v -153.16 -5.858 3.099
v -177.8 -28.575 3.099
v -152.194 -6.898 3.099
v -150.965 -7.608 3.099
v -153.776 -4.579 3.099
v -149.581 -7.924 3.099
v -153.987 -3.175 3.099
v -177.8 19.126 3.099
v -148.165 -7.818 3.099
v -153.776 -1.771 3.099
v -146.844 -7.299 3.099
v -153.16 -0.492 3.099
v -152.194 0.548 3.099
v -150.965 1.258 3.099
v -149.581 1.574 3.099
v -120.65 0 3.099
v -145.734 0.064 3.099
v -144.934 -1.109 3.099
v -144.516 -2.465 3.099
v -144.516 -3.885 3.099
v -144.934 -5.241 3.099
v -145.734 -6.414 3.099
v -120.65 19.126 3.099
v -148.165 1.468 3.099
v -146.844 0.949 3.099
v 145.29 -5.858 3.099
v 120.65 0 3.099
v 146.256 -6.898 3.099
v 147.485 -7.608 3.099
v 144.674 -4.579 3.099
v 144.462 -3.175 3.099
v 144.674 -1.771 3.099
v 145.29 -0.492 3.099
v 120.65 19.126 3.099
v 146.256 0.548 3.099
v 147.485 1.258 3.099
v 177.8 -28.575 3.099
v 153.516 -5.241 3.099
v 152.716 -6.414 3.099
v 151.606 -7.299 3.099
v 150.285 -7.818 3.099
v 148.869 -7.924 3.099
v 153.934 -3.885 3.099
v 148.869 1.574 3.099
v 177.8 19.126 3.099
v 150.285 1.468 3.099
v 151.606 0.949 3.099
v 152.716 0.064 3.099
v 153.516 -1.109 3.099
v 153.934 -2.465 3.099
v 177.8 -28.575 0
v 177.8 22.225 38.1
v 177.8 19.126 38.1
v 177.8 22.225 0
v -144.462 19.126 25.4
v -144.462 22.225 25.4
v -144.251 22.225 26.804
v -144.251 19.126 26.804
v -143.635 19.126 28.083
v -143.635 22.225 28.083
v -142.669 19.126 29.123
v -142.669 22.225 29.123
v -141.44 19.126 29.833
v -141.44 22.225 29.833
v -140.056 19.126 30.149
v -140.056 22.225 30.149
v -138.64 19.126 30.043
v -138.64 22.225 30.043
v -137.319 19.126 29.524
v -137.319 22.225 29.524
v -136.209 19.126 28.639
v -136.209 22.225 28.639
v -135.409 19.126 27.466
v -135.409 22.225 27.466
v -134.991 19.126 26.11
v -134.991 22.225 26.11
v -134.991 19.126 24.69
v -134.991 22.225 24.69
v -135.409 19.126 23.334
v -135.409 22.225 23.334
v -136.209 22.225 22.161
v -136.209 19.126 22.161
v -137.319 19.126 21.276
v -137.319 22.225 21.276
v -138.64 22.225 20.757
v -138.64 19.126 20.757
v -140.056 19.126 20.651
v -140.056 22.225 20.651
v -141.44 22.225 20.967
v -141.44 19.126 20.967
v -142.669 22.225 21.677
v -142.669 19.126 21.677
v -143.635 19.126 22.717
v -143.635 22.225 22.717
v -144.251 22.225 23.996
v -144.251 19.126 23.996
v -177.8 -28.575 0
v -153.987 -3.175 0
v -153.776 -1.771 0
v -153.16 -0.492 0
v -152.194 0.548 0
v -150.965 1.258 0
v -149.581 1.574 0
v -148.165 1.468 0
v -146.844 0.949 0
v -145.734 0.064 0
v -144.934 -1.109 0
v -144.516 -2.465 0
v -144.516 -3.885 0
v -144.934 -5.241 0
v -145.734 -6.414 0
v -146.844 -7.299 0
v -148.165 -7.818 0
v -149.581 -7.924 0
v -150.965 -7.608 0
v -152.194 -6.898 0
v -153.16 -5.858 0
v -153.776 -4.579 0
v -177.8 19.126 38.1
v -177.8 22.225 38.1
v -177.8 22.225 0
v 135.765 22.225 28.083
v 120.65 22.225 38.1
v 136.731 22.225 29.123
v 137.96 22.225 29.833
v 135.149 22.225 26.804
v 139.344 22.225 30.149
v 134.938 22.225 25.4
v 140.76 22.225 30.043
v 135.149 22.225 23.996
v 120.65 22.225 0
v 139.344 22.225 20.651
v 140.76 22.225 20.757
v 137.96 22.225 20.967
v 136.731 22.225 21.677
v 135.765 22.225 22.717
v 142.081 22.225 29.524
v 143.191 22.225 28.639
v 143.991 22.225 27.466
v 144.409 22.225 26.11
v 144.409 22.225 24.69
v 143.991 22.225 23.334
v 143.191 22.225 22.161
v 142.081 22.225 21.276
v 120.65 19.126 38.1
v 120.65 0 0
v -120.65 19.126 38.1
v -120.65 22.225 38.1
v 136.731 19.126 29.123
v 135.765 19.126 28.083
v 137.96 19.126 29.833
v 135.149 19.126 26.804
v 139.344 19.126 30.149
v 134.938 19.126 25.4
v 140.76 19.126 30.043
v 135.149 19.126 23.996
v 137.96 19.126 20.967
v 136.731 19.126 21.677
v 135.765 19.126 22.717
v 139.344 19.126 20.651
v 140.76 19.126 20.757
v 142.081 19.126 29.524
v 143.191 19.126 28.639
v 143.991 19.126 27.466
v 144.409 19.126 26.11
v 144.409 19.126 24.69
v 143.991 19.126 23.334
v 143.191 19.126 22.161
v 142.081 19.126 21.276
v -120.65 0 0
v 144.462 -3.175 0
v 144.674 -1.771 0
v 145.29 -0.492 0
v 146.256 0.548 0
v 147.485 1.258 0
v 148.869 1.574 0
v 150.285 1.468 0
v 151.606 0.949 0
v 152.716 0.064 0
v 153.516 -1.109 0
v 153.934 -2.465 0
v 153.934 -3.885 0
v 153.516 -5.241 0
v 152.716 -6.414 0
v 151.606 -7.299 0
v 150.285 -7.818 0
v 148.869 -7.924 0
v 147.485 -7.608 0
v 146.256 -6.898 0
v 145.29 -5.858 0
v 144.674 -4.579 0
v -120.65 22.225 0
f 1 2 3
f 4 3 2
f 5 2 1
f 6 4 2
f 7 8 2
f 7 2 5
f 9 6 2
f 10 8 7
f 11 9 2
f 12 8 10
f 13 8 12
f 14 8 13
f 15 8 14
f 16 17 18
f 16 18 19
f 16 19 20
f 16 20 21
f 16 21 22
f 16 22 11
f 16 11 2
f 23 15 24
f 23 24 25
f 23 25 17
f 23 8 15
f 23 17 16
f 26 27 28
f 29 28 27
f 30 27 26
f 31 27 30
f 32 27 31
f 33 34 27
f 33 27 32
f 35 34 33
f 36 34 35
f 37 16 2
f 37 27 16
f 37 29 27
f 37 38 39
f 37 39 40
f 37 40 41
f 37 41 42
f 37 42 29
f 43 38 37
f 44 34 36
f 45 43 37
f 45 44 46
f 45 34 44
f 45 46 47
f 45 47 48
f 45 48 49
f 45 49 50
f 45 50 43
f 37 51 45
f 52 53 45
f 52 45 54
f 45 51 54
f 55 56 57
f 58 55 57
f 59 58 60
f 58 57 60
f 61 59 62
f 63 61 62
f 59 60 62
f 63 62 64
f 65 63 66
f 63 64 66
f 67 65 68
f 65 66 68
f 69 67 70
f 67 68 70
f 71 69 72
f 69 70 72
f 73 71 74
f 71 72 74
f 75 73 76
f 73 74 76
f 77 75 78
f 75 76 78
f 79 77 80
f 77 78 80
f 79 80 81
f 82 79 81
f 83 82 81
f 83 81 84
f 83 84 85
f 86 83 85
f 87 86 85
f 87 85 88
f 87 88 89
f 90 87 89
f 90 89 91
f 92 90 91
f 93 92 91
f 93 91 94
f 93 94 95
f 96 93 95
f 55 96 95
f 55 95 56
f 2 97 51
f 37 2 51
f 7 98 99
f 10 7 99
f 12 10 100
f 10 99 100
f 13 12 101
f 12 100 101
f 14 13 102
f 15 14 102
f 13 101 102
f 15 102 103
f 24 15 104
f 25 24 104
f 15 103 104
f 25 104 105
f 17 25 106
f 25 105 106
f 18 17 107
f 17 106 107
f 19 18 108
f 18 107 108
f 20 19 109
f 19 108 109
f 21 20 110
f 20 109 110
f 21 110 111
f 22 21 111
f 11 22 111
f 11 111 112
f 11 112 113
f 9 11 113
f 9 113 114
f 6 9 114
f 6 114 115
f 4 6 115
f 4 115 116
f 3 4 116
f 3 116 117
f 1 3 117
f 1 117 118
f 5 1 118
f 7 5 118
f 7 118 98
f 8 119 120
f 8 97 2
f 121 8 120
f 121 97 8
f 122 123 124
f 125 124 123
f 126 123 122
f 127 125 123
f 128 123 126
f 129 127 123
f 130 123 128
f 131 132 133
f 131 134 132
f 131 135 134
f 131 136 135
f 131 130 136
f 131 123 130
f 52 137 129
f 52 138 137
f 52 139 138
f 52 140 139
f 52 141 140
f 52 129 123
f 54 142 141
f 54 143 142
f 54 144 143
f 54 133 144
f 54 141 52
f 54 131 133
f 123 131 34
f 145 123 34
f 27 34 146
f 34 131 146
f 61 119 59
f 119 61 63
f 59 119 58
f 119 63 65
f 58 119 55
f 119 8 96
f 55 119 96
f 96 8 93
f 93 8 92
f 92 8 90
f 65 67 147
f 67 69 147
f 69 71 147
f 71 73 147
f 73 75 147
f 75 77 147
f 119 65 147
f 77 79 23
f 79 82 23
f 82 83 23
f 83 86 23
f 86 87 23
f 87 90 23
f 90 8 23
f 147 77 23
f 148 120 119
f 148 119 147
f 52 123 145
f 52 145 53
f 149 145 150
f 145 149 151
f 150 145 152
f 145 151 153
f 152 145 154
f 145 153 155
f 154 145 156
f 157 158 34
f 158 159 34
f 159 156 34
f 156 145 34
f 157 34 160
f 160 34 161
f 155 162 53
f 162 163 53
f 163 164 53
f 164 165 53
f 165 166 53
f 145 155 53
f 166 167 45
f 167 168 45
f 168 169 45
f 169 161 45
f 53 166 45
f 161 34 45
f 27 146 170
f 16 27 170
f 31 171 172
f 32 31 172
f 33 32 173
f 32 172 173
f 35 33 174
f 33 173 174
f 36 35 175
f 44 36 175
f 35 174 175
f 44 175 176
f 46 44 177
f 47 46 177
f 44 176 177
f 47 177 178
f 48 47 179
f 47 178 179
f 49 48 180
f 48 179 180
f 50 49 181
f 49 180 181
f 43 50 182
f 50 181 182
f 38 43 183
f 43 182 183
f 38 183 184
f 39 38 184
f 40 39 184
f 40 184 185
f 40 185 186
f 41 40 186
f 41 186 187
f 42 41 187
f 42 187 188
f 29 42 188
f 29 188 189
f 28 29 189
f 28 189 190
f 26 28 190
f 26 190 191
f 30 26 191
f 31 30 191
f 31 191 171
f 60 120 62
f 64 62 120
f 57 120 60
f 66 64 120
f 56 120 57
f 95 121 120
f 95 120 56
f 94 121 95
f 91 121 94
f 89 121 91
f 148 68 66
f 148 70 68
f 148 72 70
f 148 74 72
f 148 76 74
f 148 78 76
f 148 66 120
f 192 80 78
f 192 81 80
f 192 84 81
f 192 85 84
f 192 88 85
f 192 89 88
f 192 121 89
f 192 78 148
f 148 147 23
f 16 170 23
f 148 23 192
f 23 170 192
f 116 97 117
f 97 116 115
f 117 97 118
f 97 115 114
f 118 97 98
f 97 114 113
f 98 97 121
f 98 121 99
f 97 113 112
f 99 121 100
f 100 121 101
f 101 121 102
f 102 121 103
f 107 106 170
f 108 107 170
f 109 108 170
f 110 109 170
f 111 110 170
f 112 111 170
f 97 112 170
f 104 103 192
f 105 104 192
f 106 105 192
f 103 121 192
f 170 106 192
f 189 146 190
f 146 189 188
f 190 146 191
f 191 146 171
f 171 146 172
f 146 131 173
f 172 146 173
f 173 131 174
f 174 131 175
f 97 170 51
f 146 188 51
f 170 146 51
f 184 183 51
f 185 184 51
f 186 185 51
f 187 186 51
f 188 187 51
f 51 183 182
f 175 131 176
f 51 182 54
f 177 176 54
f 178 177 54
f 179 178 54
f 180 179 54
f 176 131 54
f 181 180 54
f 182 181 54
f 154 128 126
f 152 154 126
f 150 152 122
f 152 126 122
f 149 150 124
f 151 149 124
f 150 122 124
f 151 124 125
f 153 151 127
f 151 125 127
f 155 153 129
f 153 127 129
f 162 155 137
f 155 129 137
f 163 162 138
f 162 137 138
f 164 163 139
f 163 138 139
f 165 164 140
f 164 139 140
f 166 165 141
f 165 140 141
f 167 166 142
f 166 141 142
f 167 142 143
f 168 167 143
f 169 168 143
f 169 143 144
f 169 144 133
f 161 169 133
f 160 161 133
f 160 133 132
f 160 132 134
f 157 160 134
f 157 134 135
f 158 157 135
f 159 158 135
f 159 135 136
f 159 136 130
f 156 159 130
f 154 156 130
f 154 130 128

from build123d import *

# Parameters (mm, degrees)
F1_DEPTH = 3.0988
F0_W     = 57.15
F0_H     = 3.0988
F2_DEPTH = 38.1
F5_D     = 9.525
F5_DEPTH = 12.7
F5_TIP   = 2.8615986981
F7_D     = 9.525
F7_DEPTH = 12.7
F7_TIP   = 2.8615986981


with BuildPart() as f1:
    # F0 (on Top) → F1 (new body)
    with BuildSketch(Plane.XY):
        Polygon((120.65, 0), (-120.65, 0), (-120.65, 19.1262), (-177.8, 19.1262), (-177.8, -28.575), (177.8, -28.575), (177.8, 19.1262), (120.65, 19.1262), align=None)
    extrude(amount=F1_DEPTH)

    # F0 (on Top) → F2 (join)
    with BuildSketch(Plane.XY):
        with Locations((-149.225, 20.6756)):
            Rectangle(F0_W, F0_H)
        with Locations((149.225, 20.6756)):
            Rectangle(F0_W, F0_H)
    extrude(amount=F2_DEPTH)

    # F5
    with Locations(Plane.XZ.offset(-19.1262)):
        with Locations((-139.7, 25.4), (139.7, 25.4)):
            Hole(F5_D / 2, depth=F5_DEPTH)
            with Locations((0, 0, -(F5_DEPTH + F5_TIP / 2))):  # 118° drill point
                Cone(0, F5_D / 2, F5_TIP, mode=Mode.SUBTRACT)

    # F7
    with Locations(Plane.XY.offset(3.0988)):
        with Locations((-149.225, -3.175), (149.225, -3.175)):
            Hole(F7_D / 2, depth=F7_DEPTH)
            with Locations((0, 0, -(F7_DEPTH + F7_TIP / 2))):  # 118° drill point
                Cone(0, F7_D / 2, F7_TIP, mode=Mode.SUBTRACT)


solid = f1.part
